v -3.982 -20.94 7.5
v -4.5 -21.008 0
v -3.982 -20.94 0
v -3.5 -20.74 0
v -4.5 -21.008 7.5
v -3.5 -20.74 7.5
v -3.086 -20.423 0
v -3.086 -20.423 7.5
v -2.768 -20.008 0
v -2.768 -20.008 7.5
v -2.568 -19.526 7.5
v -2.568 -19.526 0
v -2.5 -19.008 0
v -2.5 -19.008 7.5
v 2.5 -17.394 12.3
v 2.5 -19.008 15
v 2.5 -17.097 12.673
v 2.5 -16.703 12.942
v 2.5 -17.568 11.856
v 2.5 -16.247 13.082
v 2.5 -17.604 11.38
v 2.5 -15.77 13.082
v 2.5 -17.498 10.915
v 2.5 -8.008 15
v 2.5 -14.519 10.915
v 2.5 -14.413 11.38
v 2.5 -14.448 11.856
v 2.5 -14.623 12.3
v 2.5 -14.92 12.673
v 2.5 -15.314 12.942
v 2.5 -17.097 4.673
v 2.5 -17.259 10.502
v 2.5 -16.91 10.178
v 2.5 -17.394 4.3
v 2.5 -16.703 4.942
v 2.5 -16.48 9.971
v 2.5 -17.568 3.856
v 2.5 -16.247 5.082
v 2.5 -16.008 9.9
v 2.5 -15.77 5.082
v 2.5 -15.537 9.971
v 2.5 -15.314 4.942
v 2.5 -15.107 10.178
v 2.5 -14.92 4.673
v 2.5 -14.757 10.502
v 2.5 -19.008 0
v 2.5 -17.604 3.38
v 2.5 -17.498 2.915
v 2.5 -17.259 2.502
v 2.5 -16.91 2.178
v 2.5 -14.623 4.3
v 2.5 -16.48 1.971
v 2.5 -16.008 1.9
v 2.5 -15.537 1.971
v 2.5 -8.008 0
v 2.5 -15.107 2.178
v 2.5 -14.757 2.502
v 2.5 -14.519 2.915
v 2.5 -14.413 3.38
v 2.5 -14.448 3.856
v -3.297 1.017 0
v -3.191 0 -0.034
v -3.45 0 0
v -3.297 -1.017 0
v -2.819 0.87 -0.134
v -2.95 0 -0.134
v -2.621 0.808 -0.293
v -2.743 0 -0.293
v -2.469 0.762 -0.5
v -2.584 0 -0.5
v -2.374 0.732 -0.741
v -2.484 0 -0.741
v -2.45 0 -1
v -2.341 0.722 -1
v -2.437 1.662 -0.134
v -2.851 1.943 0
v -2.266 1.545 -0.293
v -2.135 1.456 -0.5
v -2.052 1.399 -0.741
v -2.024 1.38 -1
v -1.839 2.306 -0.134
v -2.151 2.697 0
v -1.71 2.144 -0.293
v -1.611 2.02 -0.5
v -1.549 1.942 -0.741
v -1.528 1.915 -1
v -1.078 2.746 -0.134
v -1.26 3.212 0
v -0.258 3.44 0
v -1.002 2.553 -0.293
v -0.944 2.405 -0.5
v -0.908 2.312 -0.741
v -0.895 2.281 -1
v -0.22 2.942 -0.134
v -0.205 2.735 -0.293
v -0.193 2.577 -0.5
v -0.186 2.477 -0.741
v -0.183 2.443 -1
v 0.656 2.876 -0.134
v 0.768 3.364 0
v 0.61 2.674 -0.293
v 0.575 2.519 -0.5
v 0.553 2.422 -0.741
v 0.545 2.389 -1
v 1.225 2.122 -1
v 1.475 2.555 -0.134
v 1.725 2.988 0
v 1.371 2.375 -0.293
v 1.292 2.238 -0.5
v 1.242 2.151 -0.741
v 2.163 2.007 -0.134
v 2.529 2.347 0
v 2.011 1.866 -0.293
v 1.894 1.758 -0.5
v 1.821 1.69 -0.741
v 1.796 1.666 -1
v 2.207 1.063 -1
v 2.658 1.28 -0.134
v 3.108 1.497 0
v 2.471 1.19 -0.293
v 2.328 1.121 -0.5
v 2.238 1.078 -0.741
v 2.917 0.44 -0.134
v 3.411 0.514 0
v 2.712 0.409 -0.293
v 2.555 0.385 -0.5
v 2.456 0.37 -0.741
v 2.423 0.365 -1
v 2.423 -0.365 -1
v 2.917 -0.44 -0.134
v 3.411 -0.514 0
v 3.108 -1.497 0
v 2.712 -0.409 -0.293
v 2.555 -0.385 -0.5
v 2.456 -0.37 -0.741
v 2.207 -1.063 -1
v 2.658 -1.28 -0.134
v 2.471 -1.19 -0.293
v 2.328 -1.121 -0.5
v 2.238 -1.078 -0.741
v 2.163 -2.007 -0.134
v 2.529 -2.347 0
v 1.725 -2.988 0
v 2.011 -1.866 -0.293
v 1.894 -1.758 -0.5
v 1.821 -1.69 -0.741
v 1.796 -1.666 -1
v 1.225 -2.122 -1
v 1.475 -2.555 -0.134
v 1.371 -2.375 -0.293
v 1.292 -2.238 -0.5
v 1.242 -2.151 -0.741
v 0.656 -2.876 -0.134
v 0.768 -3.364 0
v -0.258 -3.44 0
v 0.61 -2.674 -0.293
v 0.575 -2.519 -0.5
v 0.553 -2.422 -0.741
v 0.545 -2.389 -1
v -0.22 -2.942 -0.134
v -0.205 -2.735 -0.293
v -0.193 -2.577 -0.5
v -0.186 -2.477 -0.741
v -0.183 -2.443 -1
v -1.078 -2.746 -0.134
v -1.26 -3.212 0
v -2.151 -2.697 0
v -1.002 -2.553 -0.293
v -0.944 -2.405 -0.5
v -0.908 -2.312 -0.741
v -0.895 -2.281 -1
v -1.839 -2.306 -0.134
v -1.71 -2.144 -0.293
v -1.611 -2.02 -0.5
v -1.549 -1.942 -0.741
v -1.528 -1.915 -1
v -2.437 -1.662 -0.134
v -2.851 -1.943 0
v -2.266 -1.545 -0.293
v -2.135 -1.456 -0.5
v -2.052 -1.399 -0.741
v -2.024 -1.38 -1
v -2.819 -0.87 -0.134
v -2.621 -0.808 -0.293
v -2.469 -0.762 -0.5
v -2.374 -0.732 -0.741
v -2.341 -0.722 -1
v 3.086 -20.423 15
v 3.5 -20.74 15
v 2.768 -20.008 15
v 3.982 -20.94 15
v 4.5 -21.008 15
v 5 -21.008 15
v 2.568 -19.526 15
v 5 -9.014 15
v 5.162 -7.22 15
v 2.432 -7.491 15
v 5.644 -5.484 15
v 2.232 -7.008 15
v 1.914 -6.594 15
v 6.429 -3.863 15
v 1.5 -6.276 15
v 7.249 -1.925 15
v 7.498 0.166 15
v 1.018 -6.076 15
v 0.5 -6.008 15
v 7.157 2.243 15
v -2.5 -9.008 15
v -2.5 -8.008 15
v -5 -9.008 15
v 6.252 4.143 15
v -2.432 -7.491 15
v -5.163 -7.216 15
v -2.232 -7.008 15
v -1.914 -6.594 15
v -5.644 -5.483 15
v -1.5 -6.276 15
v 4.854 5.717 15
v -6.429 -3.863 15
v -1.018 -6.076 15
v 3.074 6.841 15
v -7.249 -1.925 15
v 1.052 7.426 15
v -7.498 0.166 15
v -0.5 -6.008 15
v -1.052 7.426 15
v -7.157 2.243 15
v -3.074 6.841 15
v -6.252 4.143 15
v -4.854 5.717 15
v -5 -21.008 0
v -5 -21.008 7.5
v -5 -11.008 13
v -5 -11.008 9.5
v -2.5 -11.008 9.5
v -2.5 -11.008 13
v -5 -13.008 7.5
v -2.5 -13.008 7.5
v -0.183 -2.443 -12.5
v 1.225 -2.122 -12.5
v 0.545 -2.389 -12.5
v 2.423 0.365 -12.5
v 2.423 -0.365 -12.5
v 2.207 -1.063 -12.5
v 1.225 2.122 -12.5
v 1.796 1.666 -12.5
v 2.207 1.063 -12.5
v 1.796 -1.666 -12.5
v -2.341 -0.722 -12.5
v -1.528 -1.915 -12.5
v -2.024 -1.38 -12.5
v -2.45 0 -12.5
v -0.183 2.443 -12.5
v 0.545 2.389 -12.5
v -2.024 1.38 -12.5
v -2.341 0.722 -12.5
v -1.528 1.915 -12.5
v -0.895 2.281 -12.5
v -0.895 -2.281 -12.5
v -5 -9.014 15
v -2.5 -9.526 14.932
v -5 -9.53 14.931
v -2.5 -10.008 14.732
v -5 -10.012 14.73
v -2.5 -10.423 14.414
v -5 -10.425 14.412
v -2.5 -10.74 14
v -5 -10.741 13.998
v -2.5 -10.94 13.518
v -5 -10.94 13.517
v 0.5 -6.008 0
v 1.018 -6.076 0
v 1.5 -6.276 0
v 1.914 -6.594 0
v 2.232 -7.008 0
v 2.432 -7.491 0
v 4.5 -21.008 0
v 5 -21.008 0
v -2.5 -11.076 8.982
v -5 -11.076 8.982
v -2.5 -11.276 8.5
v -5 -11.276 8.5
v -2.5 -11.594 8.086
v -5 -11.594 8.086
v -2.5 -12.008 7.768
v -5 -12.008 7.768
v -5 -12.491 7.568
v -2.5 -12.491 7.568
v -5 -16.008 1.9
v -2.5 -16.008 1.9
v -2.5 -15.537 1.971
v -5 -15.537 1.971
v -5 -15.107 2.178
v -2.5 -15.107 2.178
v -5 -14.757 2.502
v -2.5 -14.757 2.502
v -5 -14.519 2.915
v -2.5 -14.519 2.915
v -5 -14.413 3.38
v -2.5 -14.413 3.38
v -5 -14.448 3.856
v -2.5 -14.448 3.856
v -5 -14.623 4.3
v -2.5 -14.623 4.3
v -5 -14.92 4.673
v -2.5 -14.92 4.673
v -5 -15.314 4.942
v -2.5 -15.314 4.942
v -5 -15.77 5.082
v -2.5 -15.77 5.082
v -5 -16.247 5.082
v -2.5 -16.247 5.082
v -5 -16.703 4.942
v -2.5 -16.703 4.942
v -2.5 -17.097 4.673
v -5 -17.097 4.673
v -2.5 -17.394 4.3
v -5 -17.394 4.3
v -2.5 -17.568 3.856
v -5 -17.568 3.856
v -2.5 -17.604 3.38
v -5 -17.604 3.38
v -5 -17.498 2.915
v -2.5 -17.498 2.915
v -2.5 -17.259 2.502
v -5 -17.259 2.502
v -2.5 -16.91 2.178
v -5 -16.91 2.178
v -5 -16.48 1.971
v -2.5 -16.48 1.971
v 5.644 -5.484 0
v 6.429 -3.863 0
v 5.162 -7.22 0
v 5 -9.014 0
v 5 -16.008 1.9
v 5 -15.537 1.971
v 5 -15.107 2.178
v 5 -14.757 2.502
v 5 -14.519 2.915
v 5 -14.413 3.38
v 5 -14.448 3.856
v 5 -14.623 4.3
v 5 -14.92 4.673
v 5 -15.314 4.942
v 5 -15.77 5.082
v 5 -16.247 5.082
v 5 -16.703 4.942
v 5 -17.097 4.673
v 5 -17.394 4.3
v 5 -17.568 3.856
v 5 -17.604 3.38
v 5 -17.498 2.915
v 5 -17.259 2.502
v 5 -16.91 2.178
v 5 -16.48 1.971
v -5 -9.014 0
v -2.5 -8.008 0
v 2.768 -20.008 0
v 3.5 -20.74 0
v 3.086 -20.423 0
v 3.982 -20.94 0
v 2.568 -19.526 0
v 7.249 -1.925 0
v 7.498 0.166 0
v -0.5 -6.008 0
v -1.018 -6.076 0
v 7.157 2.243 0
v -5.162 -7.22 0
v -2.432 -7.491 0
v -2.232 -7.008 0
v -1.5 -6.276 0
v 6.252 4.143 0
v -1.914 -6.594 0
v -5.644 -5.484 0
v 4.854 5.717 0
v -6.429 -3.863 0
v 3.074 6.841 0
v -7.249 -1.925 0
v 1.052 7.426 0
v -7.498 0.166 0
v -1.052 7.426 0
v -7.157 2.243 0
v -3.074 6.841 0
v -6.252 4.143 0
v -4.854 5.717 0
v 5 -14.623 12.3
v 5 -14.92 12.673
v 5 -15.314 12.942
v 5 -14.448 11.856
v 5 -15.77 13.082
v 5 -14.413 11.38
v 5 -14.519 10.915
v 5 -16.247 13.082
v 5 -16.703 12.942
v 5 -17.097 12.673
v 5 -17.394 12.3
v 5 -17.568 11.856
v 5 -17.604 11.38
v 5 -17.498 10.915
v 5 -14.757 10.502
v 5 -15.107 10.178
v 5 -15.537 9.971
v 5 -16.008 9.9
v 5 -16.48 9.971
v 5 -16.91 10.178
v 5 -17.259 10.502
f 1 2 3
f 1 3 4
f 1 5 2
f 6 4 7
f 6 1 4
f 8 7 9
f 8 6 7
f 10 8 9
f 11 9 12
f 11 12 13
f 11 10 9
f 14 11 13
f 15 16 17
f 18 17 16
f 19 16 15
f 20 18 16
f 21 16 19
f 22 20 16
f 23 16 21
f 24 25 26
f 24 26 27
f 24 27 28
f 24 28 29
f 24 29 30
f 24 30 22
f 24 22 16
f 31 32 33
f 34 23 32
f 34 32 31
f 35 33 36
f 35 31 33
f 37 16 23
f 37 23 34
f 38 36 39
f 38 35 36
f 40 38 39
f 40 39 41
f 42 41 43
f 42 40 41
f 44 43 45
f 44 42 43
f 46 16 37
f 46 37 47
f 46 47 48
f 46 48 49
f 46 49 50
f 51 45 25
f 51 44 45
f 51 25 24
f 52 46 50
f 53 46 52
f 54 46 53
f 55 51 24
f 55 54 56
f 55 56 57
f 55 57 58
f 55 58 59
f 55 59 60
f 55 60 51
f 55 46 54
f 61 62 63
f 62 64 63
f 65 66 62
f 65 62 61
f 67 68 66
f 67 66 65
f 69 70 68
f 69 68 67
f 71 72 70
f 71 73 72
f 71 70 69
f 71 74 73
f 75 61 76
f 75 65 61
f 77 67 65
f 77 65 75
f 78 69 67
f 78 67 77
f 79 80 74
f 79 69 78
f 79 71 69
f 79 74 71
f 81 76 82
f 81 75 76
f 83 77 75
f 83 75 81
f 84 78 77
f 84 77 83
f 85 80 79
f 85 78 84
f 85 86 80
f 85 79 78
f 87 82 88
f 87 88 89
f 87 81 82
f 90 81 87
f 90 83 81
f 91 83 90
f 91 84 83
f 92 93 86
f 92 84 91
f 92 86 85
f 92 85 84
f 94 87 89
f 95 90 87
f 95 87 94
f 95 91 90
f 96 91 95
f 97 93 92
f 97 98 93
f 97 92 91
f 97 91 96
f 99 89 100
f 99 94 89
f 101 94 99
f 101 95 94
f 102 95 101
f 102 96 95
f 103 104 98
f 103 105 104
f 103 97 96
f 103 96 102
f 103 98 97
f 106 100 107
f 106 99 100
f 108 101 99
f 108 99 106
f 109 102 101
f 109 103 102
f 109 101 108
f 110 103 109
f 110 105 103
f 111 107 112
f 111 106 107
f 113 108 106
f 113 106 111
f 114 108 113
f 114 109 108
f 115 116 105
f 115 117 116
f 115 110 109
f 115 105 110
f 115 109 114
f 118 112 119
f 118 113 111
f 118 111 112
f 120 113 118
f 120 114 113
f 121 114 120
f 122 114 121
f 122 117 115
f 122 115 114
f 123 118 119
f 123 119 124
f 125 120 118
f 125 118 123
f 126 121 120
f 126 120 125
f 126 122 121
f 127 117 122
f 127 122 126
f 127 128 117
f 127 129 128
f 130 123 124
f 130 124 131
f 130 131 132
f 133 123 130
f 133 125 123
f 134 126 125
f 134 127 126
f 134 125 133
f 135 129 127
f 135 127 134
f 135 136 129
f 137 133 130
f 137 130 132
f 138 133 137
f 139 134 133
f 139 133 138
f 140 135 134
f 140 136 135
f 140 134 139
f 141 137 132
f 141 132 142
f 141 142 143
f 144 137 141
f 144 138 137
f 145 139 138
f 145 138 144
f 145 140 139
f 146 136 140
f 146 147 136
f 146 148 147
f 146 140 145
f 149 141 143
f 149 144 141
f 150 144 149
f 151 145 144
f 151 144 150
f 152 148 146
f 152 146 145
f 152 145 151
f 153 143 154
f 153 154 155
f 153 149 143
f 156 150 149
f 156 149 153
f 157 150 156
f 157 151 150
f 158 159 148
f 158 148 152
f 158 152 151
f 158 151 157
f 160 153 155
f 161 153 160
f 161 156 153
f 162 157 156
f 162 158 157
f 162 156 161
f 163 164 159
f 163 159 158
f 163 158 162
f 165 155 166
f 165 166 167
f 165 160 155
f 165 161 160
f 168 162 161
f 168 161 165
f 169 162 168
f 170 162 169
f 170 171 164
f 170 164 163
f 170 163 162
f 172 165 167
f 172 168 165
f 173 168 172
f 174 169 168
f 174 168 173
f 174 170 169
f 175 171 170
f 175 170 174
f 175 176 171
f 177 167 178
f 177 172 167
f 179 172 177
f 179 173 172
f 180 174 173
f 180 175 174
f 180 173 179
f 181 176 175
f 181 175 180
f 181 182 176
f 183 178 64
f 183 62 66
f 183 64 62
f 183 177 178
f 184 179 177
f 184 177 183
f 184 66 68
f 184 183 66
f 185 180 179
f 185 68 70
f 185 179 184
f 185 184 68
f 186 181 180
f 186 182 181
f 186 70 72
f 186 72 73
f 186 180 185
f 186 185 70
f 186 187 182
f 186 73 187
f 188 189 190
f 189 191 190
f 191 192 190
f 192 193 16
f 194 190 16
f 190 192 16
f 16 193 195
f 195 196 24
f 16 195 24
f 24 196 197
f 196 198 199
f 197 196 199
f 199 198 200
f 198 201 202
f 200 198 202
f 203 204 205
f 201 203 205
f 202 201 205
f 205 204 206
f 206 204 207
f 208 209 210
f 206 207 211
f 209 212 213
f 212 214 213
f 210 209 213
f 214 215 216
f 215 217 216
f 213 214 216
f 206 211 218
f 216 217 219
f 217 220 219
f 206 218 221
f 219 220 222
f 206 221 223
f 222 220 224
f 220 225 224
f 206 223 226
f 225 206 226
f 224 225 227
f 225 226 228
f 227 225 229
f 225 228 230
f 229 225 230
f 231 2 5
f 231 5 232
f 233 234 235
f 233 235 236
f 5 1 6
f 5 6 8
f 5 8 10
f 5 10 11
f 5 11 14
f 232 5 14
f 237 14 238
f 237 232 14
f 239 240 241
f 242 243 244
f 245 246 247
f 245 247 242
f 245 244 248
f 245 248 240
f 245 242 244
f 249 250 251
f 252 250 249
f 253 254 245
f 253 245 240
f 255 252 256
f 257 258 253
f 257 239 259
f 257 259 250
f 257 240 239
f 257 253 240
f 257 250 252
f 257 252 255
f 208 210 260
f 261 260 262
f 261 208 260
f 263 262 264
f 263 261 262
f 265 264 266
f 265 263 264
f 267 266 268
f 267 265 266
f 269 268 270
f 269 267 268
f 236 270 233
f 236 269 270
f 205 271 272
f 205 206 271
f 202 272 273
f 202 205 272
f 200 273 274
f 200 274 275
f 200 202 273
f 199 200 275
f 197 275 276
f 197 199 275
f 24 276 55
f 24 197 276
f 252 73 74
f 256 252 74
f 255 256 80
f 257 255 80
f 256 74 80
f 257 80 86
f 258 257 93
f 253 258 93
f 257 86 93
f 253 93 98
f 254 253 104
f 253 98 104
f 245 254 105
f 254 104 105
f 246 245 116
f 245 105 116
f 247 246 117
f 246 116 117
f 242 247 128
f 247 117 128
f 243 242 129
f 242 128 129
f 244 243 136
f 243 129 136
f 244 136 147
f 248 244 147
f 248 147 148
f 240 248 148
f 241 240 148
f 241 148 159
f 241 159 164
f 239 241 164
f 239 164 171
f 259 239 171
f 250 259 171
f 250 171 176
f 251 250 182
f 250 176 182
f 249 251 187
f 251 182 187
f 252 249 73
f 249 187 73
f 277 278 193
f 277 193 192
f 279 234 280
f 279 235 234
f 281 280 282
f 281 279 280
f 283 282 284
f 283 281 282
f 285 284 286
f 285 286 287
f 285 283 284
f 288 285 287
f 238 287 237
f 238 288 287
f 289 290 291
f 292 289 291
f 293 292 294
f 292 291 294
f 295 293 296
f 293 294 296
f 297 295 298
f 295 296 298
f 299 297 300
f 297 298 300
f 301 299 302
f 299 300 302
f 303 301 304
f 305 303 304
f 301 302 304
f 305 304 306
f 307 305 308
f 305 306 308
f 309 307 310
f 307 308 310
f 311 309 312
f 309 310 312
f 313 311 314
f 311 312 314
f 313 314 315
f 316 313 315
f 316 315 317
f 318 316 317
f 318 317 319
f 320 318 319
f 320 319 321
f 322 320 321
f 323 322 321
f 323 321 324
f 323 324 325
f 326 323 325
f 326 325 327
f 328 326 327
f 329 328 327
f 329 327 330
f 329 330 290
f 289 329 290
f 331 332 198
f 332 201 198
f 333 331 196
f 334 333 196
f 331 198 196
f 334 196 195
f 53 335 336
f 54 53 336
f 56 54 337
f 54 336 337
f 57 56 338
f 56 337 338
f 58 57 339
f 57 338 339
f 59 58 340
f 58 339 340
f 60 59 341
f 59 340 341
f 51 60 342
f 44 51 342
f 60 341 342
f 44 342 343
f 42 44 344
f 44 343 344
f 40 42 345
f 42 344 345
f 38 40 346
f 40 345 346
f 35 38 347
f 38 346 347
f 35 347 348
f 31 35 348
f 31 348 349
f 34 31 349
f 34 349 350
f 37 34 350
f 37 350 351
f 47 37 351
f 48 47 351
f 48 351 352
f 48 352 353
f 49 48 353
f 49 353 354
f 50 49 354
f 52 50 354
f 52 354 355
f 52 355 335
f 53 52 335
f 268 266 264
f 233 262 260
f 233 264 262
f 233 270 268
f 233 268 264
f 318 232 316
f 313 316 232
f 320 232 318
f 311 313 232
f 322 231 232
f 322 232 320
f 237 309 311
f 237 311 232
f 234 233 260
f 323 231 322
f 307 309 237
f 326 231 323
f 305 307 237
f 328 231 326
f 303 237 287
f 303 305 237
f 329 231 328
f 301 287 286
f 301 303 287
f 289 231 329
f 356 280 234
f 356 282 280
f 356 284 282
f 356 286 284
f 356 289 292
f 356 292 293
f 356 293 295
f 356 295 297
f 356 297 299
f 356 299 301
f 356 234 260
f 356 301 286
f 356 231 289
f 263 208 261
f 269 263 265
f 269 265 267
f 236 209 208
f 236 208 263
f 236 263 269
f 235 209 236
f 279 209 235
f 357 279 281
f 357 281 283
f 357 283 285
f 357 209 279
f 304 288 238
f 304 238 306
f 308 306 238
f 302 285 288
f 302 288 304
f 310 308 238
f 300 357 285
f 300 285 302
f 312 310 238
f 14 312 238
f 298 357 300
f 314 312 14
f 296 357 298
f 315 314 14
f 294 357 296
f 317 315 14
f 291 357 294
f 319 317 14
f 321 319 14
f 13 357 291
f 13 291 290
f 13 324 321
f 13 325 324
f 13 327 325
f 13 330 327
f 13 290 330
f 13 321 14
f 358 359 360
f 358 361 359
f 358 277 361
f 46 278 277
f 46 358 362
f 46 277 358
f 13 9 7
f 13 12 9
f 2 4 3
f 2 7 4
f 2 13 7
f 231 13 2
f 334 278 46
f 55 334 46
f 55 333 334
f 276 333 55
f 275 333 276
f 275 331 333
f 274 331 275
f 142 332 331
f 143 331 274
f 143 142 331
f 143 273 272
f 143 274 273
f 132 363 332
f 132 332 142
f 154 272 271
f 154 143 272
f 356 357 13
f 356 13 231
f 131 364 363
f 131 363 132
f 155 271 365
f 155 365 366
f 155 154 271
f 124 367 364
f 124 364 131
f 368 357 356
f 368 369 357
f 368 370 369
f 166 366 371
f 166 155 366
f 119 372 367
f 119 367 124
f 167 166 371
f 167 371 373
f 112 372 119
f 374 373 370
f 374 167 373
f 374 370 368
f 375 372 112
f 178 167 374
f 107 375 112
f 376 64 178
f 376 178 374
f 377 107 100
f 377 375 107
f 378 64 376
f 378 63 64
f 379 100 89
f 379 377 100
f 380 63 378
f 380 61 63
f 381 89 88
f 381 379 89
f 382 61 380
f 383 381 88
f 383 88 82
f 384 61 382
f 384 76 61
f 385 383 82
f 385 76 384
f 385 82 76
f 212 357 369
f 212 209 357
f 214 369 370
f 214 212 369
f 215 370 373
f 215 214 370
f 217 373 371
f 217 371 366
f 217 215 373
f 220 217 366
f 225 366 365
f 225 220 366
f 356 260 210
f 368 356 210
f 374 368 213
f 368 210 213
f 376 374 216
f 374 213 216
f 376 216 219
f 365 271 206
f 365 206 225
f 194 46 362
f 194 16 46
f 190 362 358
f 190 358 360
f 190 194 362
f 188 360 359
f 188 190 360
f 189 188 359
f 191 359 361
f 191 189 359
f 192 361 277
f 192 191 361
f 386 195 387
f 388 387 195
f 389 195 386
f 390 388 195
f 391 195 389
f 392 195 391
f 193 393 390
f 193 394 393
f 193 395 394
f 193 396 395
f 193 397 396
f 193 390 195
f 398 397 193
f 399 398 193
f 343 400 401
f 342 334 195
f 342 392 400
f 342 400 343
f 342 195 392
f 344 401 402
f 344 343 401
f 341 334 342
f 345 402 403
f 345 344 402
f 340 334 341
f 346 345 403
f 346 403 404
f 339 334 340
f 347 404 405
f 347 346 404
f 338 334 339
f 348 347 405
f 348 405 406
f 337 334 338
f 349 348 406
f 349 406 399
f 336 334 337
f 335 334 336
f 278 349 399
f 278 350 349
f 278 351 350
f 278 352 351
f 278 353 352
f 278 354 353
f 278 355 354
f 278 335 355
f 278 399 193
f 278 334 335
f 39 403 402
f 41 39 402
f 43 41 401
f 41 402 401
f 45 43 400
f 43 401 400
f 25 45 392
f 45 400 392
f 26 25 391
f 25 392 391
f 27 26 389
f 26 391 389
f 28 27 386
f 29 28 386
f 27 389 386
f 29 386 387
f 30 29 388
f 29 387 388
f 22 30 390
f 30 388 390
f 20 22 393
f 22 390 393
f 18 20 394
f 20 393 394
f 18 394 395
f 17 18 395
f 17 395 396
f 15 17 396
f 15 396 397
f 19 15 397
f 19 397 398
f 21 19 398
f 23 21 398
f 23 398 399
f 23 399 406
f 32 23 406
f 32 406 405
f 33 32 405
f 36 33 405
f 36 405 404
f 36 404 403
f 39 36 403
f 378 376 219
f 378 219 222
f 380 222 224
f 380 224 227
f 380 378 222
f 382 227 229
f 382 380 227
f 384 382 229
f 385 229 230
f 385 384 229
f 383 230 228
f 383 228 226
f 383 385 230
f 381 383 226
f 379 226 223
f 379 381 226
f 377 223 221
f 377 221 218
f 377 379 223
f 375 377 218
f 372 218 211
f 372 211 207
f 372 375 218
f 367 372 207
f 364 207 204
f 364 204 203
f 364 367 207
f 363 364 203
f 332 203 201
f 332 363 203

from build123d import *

# Parameters (mm, degrees)
BOSS_EXTRUDE1_DEPTH = 15
SKETCH3_R           = 2.45
BOSS_EXTRUDE2_DEPTH = 12.5
FILLET2_R           = 10
SKETCH8_R           = 1.6
CUT_EXTRUDE6_DEPTH  = 29.681007074
CUT_EXTRUDE7_REACH  = 30.681
SKETCH9_W           = 7.5
SKETCH9_H           = 10
CUT_EXTRUDE8_REACH  = 30.681
SKETCH10_R          = 1.6
FILLET3_R           = 1
FILLET4_R           = 2


with BuildPart() as part:
    # Sketch2 → Boss-Extrude1 (new body)
    with BuildSketch(Plane.XY):
        with BuildLine():
            Line((-2.5, -6.008335649), (-2.5, -21.008335649))
            Line((-2.5, -21.008335649), (-5, -21.008335649))
            Line((-5, -21.008335649), (-5, -6.008335649))
            Line((-5, -6.008335649), (-5, -5.590169944))
            ThreePointArc((-5, -5.590169944), (0, 7.5), (5, -5.590169944))
            Line((5, -5.590169944), (5, -6.008335649))
            Line((5, -6.008335649), (5, -21.008335649))
            Line((5, -21.008335649), (2.5, -21.008335649))
            Line((2.5, -21.008335649), (2.5, -6.008335649))
            Line((2.5, -6.008335649), (-2.5, -6.008335649))
        make_face()
    extrude(amount=BOSS_EXTRUDE1_DEPTH)

    # Sketch3 → Boss-Extrude2 (add)
    with BuildSketch(Plane(origin=(0, 0, 0), x_dir=(-1, 0, 0), z_dir=(0, 0, -1))):
        Circle(SKETCH3_R)
    extrude(amount=BOSS_EXTRUDE2_DEPTH)

    # Fillet2
    fillet2_edges = [part.edges().sort_by_distance(p)[0] for p in [
        (-5, -5.590169944, 7.5),
        (5, -5.590169944, 7.5),
    ]]
    fillet(fillet2_edges, radius=FILLET2_R)

    # Sketch8 → Cut-Extrude6 (cut, through all)
    with BuildSketch(Plane(origin=(5, 0, 0), x_dir=(0, 0, -1), z_dir=(1, 0, 0))):
        with Locations((-3.5, -16.008335649)):
            Circle(SKETCH8_R)
    extrude(amount=-CUT_EXTRUDE6_DEPTH, mode=Mode.SUBTRACT)

    # Sketch9 → Cut-Extrude7 (cut, up to next)
    with BuildSketch(Plane.ZY.offset(5), mode=Mode.PRIVATE) as cut_extrude7_sk1:
        with Locations((11.25, -16.008335649)):
            Rectangle(SKETCH9_W, SKETCH9_H)
    cut_extrude7_tool1 = extrude(cut_extrude7_sk1.sketch, amount=-CUT_EXTRUDE7_REACH, mode=Mode.PRIVATE) & part.part
    add(cut_extrude7_tool1.solids().sort_by_distance((-5, -16.008336, 11.25))[0], mode=Mode.SUBTRACT)

    # Sketch10 → Cut-Extrude8 (cut, up to next)
    with BuildSketch(Plane(origin=(5, 0, 0), x_dir=(0, 0, -1), z_dir=(1, 0, 0)), mode=Mode.PRIVATE) as cut_extrude8_sk1:
        with Locations((-11.5, -16.008335649)):
            Circle(SKETCH10_R)
    cut_extrude8_tool1 = extrude(cut_extrude8_sk1.sketch, amount=-CUT_EXTRUDE8_REACH, mode=Mode.PRIVATE) & part.part
    add(cut_extrude8_tool1.solids().sort_by_distance((5, -16.008336, 11.5))[0], mode=Mode.SUBTRACT)

    # Fillet3
    fillet3_edges = [part.edges().sort_by_distance(p)[0] for p in [
        (2.45, 0, 0),
    ]]
    fillet(fillet3_edges, radius=FILLET3_R)

    # Fillet4
    fillet4_edges = [part.edges().sort_by_distance(p)[0] for p in [
        (2.5, -6.008335649, 7.5),
        (-2.5, -6.008335649, 7.5),
        (-3.75, -11.008335649, 7.5),
        (-3.75, -11.008335649, 15),
        (-2.5, -21.008335649, 3.75),
        (2.5, -21.008335649, 7.5),
    ]]
    fillet(fillet4_edges, radius=FILLET4_R)


solid = part.part
